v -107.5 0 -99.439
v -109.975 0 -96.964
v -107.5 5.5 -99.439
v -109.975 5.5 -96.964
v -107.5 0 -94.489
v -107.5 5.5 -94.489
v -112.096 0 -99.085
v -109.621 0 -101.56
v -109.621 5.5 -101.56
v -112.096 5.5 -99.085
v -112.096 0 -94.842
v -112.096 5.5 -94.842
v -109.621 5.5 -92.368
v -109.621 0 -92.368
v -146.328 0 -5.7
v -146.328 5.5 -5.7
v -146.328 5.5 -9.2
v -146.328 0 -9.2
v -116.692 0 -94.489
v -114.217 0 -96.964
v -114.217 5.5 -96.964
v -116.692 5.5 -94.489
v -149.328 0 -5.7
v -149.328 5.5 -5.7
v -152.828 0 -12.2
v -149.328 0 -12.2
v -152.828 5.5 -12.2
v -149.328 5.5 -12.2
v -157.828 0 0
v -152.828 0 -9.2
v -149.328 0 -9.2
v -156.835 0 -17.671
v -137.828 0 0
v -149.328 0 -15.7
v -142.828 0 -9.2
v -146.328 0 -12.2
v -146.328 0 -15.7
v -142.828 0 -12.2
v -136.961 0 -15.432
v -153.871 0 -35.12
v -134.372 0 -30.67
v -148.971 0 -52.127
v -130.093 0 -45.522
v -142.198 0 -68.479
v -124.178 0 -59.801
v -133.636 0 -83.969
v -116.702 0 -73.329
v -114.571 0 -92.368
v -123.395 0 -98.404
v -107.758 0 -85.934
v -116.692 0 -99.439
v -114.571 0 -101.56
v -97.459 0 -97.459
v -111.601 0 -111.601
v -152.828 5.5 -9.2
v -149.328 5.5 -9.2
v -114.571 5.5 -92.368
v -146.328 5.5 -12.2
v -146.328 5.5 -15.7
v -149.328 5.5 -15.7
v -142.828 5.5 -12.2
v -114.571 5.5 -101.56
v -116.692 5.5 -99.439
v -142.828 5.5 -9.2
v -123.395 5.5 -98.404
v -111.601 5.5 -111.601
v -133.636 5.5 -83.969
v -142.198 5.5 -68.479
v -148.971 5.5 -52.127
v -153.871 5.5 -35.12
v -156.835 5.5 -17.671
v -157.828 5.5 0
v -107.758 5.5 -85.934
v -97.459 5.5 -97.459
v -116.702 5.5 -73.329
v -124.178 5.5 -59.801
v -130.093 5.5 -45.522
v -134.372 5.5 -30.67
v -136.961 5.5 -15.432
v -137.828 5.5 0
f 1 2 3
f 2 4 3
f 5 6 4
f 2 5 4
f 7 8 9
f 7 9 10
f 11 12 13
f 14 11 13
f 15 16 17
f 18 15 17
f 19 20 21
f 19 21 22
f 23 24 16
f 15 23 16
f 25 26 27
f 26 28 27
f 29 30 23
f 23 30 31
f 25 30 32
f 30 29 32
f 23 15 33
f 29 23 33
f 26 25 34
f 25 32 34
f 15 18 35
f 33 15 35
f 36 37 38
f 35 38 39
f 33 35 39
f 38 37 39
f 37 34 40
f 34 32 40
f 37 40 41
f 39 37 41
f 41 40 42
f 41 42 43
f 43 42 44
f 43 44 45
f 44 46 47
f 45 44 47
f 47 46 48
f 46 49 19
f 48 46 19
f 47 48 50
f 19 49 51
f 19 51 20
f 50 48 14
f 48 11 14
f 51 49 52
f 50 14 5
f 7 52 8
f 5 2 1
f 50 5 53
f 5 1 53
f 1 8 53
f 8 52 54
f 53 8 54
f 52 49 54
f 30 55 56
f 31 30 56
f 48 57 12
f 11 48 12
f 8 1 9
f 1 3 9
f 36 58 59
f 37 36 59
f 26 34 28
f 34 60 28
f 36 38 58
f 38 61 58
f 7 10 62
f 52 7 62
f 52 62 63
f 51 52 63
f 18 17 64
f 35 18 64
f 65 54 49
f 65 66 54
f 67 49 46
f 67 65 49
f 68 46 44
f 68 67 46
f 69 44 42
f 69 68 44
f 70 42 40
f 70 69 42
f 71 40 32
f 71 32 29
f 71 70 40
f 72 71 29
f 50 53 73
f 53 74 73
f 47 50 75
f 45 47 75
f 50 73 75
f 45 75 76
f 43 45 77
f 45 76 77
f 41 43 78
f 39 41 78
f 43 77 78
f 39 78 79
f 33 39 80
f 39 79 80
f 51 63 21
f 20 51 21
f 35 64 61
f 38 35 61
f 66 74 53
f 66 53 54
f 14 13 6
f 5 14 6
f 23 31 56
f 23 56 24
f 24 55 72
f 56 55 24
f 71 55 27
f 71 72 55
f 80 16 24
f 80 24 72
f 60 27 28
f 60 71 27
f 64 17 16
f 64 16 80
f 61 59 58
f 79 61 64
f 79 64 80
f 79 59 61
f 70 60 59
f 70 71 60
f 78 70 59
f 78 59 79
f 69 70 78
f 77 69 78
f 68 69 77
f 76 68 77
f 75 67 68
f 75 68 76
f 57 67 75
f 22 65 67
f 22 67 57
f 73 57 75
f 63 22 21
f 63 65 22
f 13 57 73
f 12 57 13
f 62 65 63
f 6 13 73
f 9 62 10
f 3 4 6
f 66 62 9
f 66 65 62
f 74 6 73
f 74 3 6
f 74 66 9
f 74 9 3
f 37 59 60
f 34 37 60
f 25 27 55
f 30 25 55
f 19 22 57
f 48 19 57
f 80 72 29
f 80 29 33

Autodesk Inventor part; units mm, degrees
ref_plane "YZ Plane" through (0, 0, 0) normal (1, 0, 0) x (0, 1, 0)
ref_plane "XZ Plane" through (0, 0, 0) normal (0, 1, 0) x (-1, 0, 0)
ref_plane "XY Plane" through (0, 0, 0) normal (0, 0, 1) x (1, 0, 0)
sketch "スケッチ1" plane through (0, 0, 0) normal (0, 1, 0) x (-1, 0, 0)
  circle A0 centre (0, 0) radius 178.1675
  circle A1 centre (0, 0) radius 157.8276
  line L0 (168.1877, 0) -> (166.7488, -21.9529)
  line L1 (168.1877, 0) -> (130.1721, 2.4917) construction
  line L2 (249.4344, 0) -> (-249.4344, 0) projected
  line L3 (166.7488, -21.9529) -> (156.7702, -21.2989)
  line L4 (156.7702, -21.2989) -> (158.2091, 0.654) construction
  line L5 (158.2091, 0.654) -> (168.1877, 0)
  line L6 (157.4896, -10.3224) -> (0, 0)
  line L7 (166.7488, -21.9529) -> (162.4568, -43.5302)
  line L8 (162.4568, -43.5302) -> (152.649, -41.5793) construction
  line L9 (152.649, -41.5793) -> (156.9409, -20.002) construction
  line L10 (156.9409, -20.002) -> (166.7488, -21.9529) construction
  line L11 (162.4568, -43.5302) -> (155.3851, -64.3626)
  line L12 (155.3851, -64.3626) -> (145.9158, -61.1482) construction
  line L13 (145.9158, -61.1482) -> (152.9875, -40.3158) construction
  line L14 (152.9875, -40.3158) -> (162.4568, -43.5302) construction
  line L15 (155.3851, -64.3626) -> (145.6548, -84.0938)
  line L16 (145.6548, -84.0938) -> (136.6861, -79.6709) construction
  line L17 (136.6861, -79.6709) -> (146.4164, -59.9397) construction
  line L18 (146.4164, -59.9397) -> (155.3851, -64.3626) construction
  line L19 (0, 0) -> (111.6009, -111.6009)
  line L20 (145.6548, -84.0938) -> (137.3401, -78.5381) construction
  line L21 (137.3401, -78.5381) -> (125.1176, -96.8305) construction
  line L22 (125.1176, -96.8305) -> (133.4323, -102.3862) construction
  line L23 (133.4323, -102.3862) -> (145.6548, -84.0938)
  line L24 (133.4323, -102.3862) -> (125.9139, -95.7927) construction
  line L25 (125.9139, -95.7927) -> (111.4082, -112.3332) construction
  line L26 (111.4082, -112.3332) -> (118.9266, -118.9266)
  line L27 (118.9266, -118.9266) -> (133.4323, -102.3862)
  line L28 (111.6009, -111.6009) -> (118.9266, -118.9266)
  line L29 (166.7488, -21.9529) -> (176.7274, -22.6069) construction
  line L30 (118.9266, -118.9266) -> (125.9834, -125.9834)
  point P0 (154.795, -30.7906)
  point P1 (149.4517, -50.732)
  point P2 (141.5512, -69.8053)
  point P3 (131.2288, -87.6843)
  point P4 (118.661, -104.0629)
  point P5 (157.8276, 0)
  point P6 (178.1675, 0)
  dimension "d0" = 22
  dimension "d1" = 10
  dimension "d2" = 45
  dimension "d4" = 315.6551
extrude "押し出し1" add sketch "スケッチ1" along normal blind 5.5 contours L30 L27 L23 L15 L11 L7 L0 L2 A0 | L28 A1 L2 L0 L7 L11 L15 L23 L27
sketch "スケッチ2" plane through (0, 5.5, 0) normal (0, 1, 0) x (1, 0, 0)
  circle A0 centre (0, 0) radius 309.8276
  line L0 (-168.1877, 0) -> (-166.7488, 21.9529) projected
  line L1 (-166.7488, 21.9529) -> (-162.4568, 43.5302) projected
  line L2 (-162.4568, 43.5302) -> (-155.3851, 64.3626) projected
  line L3 (-155.3851, 64.3626) -> (-145.6548, 84.0938) projected
  line L4 (-133.4323, 102.3862) -> (-145.6548, 84.0938) projected
  line L5 (-118.9266, 118.9266) -> (-133.4323, 102.3862) projected
  line L6 (-167.4682, 10.9764) -> (-166.0294, 32.9293)
  line L7 (-166.0294, 32.9293) -> (-275.7938, 40.1237)
  line L8 (-275.7938, 40.1237) -> (-277.2327, 18.1708)
  line L9 (-277.2327, 18.1708) -> (-167.4682, 10.9764)
  line L10 (-164.6028, 32.7415) -> (-160.3108, 54.3188)
  line L11 (-160.3108, 54.3188) -> (-268.1972, 75.7787)
  line L12 (-268.1972, 75.7787) -> (-272.4892, 54.2015)
  line L13 (-272.4892, 54.2015) -> (-164.6028, 32.7415)
  circle A1 centre (-166.7488, 21.9529) radius 11
  circle A2 centre (-162.4568, 43.5302) radius 11
  line L14 (-158.921, 53.9464) -> (-151.8493, 74.7789)
  line L15 (-151.8493, 74.7789) -> (-256.0116, 110.1372)
  line L16 (-256.0116, 110.1372) -> (-263.0833, 89.3047)
  line L17 (-263.0833, 89.3047) -> (-158.921, 53.9464)
  circle A3 centre (-155.3851, 64.3626) radius 11
  arc A4 (-275.7591, 62.4834) -> (-281.3553, 41.7349) centre (-166.7488, 21.9529) ccw
  line L18 (-178.1663, 0.654) -> (-158.2091, -0.654)
  line L19 (-158.2091, -0.654) -> (-156.7702, 21.2989)
  line L20 (-156.7702, 21.2989) -> (-176.7274, 22.6069)
  line L21 (-176.7274, 22.6069) -> (-178.1663, 0.654)
  line L22 (-177.4468, 11.6305) -> (-275.7938, 40.1237)
  line L23 (-176.7274, 22.6069) -> (-176.008, 33.5834)
  line L24 (-176.008, 33.5834) -> (-275.7591, 62.4834)
  line L25 (-275.7938, 40.1237) -> (-281.3553, 41.7349)
  circle A5 centre (0, 0) radius 137.8276
  line L26 (0, 0) -> (-219.0812, 219.0812)
  line L27 (-111.6009, 111.6009) -> (-125.9834, 125.9834) projected
  line L28 (-433.7586, 0) -> (433.7586, 0) projected
  circle A6 centre (0, 0) radius 279.8276 construction
  arc A7 (-111.6009, 111.6009) -> (-157.8276, 0) centre (0, 0) ccw projected
  point P0 (-158.1662, 0)
  point P1 (-137.8276, 0)
  point P2 (-97.4588, 97.4588)
  point P3 (-309.8276, 0)
  dimension "d7" = 22
  dimension "d10" = 20
  dimension "d11" = 100
  dimension "d12" = 30
  dimension "d14" = 20
  dimension "d17" = 122
extrude "押し出し2" add sketch "スケッチ2" against normal blind 5.5 contours L26 L5 L4 L3 A3 L15 L16 L17 A2 L11 L12 L24 A4 L25 L8 L9 L21 L18 L28 A0 | L18 L21 L9 L0 | L0 A1 L19 L28 | A5 L28 A7 A1 A2 A3 L26 | L26 A7 A3 L3 L4 L5 | A1 L21 L20 L0 | L9 L21 A1 | L0 L20 L19 A1 | L19 A7 L28 | L6 A1 L1 | L20 L23 A1 L6 | L1 A1 A7 L19 L20 | L22 L7 L23 A1 L21 | L9 L8 L22 | A1 L23 L21 | A1 A7 L19 | A7 A3 L2 L3 | A3 A7 | A2 L10 L1 | A1 L7 L24 L13 | A2 A7 A1 | L13 L24 L12 L11 A2 | L1 L2 A2 A7 | A1 L23 L7 | L25 A4 L24 L12 L13 L7 | A7 A1 | A7 A2 A3 | L3 L14 A3 | L10 A2 L2 | L13 L12 L24 | A7 A2 | A3 L14 L2 | L17 L16 L15 A3
sketch "スケッチ3" plane through (0, 5.5, 0) normal (0, 1, 0) x (1, 0, 0)
  circle A0 centre (0, 0) radius 157.8276
  arc A1 (-97.4588, 97.4588) -> (-137.8276, 0) centre (0, 0) ccw projected
  line L0 (-97.4588, 97.4588) -> (-219.0812, 219.0812) projected
  line L1 (-309.8276, 0) -> (-137.8276, 0) projected
  arc A2 (-219.0812, 219.0812) -> (-309.8276, 0) centre (0, 0) ccw projected
  point P0 (-157.8276, 0)
  point P1 (-111.6009, 111.6009)
  dimension "d18" = 20
extrude "押し出し3" cut sketch "スケッチ3" against normal through all contours A0 L1 A2 L0
sketch "スケッチ4" plane through (0, 5.5, 0) normal (0, 1, 0) x (1, 0, 0)
  line L0 (-152.8276, 9.2) -> (-142.8276, 9.2)
  line L1 (-142.8276, 9.2) -> (-142.8276, 12.2)
  line L2 (-142.8276, 12.2) -> (-152.8276, 12.2)
  line L3 (-152.8276, 12.2) -> (-152.8276, 9.2)
  line L4 (-149.3276, 5.7) -> (-146.3276, 5.7)
  line L5 (-146.3276, 5.7) -> (-146.3276, 15.7)
  line L6 (-146.3276, 15.7) -> (-149.3276, 15.7)
  line L7 (-149.3276, 15.7) -> (-149.3276, 5.7)
  line L8 (-157.8276, 0) -> (-137.8276, 0) projected
  line L9 (-97.4588, 97.4588) -> (-111.6009, 111.6009) projected
  line L10 (-104.5299, 104.5299) -> (-123.5496, 85.5102) construction
  line L11 (-109.621, 92.3676) -> (-107.4997, 94.489)
  line L12 (-107.4997, 94.489) -> (-114.5708, 101.56)
  line L13 (-114.5708, 101.56) -> (-116.6921, 99.4387)
  line L14 (-116.6921, 99.4387) -> (-109.621, 92.3676)
  line L15 (-116.6921, 94.489) -> (-114.5708, 92.3676)
  line L16 (-114.5708, 92.3676) -> (-107.4997, 99.4387)
  line L17 (-107.4997, 99.4387) -> (-109.621, 101.56)
  line L18 (-109.621, 101.56) -> (-116.6921, 94.489)
  line L19 (-97.4588, 97.4588) -> (-111.6009, 111.6009) projected
  line L20 (-108.5604, 93.4283) -> (-115.6315, 100.4994) construction
  point P0 (0, 0)
  point P1 (-147.8276, 0)
  point P2 (-147.8276, 5.7)
  point P3 (-147.8276, 9.2)
  point P4 (-149.3276, 10.7)
  point P5 (-152.8276, 10.7)
  point P6 (-147.8276, 0)
  point P7 (-149.3276, 12.2)
  point P8 (-149.3276, 9.2)
  point P9 (-146.3276, 9.2)
  point P10 (-146.3276, 12.2)
  point P11 (-108.5604, 100.4994)
  point P12 (-113.1566, 98.0245)
  point P13 (-111.0353, 98.0245)
  point P14 (-114.2172, 96.9638)
  point P15 (-112.0959, 94.8425)
  point P16 (-109.9746, 96.9638)
  point P17 (-112.0959, 99.0852)
  dimension "d21" = 10
  dimension "d22" = 3
  dimension "d23" = 5.7
  dimension "d30" = 5.7
extrude "押し出し4" cut sketch "スケッチ4" against normal through all
equation "\"d30\" = d23"
properties part number "back_under" material "木材 (カエデ材)"
